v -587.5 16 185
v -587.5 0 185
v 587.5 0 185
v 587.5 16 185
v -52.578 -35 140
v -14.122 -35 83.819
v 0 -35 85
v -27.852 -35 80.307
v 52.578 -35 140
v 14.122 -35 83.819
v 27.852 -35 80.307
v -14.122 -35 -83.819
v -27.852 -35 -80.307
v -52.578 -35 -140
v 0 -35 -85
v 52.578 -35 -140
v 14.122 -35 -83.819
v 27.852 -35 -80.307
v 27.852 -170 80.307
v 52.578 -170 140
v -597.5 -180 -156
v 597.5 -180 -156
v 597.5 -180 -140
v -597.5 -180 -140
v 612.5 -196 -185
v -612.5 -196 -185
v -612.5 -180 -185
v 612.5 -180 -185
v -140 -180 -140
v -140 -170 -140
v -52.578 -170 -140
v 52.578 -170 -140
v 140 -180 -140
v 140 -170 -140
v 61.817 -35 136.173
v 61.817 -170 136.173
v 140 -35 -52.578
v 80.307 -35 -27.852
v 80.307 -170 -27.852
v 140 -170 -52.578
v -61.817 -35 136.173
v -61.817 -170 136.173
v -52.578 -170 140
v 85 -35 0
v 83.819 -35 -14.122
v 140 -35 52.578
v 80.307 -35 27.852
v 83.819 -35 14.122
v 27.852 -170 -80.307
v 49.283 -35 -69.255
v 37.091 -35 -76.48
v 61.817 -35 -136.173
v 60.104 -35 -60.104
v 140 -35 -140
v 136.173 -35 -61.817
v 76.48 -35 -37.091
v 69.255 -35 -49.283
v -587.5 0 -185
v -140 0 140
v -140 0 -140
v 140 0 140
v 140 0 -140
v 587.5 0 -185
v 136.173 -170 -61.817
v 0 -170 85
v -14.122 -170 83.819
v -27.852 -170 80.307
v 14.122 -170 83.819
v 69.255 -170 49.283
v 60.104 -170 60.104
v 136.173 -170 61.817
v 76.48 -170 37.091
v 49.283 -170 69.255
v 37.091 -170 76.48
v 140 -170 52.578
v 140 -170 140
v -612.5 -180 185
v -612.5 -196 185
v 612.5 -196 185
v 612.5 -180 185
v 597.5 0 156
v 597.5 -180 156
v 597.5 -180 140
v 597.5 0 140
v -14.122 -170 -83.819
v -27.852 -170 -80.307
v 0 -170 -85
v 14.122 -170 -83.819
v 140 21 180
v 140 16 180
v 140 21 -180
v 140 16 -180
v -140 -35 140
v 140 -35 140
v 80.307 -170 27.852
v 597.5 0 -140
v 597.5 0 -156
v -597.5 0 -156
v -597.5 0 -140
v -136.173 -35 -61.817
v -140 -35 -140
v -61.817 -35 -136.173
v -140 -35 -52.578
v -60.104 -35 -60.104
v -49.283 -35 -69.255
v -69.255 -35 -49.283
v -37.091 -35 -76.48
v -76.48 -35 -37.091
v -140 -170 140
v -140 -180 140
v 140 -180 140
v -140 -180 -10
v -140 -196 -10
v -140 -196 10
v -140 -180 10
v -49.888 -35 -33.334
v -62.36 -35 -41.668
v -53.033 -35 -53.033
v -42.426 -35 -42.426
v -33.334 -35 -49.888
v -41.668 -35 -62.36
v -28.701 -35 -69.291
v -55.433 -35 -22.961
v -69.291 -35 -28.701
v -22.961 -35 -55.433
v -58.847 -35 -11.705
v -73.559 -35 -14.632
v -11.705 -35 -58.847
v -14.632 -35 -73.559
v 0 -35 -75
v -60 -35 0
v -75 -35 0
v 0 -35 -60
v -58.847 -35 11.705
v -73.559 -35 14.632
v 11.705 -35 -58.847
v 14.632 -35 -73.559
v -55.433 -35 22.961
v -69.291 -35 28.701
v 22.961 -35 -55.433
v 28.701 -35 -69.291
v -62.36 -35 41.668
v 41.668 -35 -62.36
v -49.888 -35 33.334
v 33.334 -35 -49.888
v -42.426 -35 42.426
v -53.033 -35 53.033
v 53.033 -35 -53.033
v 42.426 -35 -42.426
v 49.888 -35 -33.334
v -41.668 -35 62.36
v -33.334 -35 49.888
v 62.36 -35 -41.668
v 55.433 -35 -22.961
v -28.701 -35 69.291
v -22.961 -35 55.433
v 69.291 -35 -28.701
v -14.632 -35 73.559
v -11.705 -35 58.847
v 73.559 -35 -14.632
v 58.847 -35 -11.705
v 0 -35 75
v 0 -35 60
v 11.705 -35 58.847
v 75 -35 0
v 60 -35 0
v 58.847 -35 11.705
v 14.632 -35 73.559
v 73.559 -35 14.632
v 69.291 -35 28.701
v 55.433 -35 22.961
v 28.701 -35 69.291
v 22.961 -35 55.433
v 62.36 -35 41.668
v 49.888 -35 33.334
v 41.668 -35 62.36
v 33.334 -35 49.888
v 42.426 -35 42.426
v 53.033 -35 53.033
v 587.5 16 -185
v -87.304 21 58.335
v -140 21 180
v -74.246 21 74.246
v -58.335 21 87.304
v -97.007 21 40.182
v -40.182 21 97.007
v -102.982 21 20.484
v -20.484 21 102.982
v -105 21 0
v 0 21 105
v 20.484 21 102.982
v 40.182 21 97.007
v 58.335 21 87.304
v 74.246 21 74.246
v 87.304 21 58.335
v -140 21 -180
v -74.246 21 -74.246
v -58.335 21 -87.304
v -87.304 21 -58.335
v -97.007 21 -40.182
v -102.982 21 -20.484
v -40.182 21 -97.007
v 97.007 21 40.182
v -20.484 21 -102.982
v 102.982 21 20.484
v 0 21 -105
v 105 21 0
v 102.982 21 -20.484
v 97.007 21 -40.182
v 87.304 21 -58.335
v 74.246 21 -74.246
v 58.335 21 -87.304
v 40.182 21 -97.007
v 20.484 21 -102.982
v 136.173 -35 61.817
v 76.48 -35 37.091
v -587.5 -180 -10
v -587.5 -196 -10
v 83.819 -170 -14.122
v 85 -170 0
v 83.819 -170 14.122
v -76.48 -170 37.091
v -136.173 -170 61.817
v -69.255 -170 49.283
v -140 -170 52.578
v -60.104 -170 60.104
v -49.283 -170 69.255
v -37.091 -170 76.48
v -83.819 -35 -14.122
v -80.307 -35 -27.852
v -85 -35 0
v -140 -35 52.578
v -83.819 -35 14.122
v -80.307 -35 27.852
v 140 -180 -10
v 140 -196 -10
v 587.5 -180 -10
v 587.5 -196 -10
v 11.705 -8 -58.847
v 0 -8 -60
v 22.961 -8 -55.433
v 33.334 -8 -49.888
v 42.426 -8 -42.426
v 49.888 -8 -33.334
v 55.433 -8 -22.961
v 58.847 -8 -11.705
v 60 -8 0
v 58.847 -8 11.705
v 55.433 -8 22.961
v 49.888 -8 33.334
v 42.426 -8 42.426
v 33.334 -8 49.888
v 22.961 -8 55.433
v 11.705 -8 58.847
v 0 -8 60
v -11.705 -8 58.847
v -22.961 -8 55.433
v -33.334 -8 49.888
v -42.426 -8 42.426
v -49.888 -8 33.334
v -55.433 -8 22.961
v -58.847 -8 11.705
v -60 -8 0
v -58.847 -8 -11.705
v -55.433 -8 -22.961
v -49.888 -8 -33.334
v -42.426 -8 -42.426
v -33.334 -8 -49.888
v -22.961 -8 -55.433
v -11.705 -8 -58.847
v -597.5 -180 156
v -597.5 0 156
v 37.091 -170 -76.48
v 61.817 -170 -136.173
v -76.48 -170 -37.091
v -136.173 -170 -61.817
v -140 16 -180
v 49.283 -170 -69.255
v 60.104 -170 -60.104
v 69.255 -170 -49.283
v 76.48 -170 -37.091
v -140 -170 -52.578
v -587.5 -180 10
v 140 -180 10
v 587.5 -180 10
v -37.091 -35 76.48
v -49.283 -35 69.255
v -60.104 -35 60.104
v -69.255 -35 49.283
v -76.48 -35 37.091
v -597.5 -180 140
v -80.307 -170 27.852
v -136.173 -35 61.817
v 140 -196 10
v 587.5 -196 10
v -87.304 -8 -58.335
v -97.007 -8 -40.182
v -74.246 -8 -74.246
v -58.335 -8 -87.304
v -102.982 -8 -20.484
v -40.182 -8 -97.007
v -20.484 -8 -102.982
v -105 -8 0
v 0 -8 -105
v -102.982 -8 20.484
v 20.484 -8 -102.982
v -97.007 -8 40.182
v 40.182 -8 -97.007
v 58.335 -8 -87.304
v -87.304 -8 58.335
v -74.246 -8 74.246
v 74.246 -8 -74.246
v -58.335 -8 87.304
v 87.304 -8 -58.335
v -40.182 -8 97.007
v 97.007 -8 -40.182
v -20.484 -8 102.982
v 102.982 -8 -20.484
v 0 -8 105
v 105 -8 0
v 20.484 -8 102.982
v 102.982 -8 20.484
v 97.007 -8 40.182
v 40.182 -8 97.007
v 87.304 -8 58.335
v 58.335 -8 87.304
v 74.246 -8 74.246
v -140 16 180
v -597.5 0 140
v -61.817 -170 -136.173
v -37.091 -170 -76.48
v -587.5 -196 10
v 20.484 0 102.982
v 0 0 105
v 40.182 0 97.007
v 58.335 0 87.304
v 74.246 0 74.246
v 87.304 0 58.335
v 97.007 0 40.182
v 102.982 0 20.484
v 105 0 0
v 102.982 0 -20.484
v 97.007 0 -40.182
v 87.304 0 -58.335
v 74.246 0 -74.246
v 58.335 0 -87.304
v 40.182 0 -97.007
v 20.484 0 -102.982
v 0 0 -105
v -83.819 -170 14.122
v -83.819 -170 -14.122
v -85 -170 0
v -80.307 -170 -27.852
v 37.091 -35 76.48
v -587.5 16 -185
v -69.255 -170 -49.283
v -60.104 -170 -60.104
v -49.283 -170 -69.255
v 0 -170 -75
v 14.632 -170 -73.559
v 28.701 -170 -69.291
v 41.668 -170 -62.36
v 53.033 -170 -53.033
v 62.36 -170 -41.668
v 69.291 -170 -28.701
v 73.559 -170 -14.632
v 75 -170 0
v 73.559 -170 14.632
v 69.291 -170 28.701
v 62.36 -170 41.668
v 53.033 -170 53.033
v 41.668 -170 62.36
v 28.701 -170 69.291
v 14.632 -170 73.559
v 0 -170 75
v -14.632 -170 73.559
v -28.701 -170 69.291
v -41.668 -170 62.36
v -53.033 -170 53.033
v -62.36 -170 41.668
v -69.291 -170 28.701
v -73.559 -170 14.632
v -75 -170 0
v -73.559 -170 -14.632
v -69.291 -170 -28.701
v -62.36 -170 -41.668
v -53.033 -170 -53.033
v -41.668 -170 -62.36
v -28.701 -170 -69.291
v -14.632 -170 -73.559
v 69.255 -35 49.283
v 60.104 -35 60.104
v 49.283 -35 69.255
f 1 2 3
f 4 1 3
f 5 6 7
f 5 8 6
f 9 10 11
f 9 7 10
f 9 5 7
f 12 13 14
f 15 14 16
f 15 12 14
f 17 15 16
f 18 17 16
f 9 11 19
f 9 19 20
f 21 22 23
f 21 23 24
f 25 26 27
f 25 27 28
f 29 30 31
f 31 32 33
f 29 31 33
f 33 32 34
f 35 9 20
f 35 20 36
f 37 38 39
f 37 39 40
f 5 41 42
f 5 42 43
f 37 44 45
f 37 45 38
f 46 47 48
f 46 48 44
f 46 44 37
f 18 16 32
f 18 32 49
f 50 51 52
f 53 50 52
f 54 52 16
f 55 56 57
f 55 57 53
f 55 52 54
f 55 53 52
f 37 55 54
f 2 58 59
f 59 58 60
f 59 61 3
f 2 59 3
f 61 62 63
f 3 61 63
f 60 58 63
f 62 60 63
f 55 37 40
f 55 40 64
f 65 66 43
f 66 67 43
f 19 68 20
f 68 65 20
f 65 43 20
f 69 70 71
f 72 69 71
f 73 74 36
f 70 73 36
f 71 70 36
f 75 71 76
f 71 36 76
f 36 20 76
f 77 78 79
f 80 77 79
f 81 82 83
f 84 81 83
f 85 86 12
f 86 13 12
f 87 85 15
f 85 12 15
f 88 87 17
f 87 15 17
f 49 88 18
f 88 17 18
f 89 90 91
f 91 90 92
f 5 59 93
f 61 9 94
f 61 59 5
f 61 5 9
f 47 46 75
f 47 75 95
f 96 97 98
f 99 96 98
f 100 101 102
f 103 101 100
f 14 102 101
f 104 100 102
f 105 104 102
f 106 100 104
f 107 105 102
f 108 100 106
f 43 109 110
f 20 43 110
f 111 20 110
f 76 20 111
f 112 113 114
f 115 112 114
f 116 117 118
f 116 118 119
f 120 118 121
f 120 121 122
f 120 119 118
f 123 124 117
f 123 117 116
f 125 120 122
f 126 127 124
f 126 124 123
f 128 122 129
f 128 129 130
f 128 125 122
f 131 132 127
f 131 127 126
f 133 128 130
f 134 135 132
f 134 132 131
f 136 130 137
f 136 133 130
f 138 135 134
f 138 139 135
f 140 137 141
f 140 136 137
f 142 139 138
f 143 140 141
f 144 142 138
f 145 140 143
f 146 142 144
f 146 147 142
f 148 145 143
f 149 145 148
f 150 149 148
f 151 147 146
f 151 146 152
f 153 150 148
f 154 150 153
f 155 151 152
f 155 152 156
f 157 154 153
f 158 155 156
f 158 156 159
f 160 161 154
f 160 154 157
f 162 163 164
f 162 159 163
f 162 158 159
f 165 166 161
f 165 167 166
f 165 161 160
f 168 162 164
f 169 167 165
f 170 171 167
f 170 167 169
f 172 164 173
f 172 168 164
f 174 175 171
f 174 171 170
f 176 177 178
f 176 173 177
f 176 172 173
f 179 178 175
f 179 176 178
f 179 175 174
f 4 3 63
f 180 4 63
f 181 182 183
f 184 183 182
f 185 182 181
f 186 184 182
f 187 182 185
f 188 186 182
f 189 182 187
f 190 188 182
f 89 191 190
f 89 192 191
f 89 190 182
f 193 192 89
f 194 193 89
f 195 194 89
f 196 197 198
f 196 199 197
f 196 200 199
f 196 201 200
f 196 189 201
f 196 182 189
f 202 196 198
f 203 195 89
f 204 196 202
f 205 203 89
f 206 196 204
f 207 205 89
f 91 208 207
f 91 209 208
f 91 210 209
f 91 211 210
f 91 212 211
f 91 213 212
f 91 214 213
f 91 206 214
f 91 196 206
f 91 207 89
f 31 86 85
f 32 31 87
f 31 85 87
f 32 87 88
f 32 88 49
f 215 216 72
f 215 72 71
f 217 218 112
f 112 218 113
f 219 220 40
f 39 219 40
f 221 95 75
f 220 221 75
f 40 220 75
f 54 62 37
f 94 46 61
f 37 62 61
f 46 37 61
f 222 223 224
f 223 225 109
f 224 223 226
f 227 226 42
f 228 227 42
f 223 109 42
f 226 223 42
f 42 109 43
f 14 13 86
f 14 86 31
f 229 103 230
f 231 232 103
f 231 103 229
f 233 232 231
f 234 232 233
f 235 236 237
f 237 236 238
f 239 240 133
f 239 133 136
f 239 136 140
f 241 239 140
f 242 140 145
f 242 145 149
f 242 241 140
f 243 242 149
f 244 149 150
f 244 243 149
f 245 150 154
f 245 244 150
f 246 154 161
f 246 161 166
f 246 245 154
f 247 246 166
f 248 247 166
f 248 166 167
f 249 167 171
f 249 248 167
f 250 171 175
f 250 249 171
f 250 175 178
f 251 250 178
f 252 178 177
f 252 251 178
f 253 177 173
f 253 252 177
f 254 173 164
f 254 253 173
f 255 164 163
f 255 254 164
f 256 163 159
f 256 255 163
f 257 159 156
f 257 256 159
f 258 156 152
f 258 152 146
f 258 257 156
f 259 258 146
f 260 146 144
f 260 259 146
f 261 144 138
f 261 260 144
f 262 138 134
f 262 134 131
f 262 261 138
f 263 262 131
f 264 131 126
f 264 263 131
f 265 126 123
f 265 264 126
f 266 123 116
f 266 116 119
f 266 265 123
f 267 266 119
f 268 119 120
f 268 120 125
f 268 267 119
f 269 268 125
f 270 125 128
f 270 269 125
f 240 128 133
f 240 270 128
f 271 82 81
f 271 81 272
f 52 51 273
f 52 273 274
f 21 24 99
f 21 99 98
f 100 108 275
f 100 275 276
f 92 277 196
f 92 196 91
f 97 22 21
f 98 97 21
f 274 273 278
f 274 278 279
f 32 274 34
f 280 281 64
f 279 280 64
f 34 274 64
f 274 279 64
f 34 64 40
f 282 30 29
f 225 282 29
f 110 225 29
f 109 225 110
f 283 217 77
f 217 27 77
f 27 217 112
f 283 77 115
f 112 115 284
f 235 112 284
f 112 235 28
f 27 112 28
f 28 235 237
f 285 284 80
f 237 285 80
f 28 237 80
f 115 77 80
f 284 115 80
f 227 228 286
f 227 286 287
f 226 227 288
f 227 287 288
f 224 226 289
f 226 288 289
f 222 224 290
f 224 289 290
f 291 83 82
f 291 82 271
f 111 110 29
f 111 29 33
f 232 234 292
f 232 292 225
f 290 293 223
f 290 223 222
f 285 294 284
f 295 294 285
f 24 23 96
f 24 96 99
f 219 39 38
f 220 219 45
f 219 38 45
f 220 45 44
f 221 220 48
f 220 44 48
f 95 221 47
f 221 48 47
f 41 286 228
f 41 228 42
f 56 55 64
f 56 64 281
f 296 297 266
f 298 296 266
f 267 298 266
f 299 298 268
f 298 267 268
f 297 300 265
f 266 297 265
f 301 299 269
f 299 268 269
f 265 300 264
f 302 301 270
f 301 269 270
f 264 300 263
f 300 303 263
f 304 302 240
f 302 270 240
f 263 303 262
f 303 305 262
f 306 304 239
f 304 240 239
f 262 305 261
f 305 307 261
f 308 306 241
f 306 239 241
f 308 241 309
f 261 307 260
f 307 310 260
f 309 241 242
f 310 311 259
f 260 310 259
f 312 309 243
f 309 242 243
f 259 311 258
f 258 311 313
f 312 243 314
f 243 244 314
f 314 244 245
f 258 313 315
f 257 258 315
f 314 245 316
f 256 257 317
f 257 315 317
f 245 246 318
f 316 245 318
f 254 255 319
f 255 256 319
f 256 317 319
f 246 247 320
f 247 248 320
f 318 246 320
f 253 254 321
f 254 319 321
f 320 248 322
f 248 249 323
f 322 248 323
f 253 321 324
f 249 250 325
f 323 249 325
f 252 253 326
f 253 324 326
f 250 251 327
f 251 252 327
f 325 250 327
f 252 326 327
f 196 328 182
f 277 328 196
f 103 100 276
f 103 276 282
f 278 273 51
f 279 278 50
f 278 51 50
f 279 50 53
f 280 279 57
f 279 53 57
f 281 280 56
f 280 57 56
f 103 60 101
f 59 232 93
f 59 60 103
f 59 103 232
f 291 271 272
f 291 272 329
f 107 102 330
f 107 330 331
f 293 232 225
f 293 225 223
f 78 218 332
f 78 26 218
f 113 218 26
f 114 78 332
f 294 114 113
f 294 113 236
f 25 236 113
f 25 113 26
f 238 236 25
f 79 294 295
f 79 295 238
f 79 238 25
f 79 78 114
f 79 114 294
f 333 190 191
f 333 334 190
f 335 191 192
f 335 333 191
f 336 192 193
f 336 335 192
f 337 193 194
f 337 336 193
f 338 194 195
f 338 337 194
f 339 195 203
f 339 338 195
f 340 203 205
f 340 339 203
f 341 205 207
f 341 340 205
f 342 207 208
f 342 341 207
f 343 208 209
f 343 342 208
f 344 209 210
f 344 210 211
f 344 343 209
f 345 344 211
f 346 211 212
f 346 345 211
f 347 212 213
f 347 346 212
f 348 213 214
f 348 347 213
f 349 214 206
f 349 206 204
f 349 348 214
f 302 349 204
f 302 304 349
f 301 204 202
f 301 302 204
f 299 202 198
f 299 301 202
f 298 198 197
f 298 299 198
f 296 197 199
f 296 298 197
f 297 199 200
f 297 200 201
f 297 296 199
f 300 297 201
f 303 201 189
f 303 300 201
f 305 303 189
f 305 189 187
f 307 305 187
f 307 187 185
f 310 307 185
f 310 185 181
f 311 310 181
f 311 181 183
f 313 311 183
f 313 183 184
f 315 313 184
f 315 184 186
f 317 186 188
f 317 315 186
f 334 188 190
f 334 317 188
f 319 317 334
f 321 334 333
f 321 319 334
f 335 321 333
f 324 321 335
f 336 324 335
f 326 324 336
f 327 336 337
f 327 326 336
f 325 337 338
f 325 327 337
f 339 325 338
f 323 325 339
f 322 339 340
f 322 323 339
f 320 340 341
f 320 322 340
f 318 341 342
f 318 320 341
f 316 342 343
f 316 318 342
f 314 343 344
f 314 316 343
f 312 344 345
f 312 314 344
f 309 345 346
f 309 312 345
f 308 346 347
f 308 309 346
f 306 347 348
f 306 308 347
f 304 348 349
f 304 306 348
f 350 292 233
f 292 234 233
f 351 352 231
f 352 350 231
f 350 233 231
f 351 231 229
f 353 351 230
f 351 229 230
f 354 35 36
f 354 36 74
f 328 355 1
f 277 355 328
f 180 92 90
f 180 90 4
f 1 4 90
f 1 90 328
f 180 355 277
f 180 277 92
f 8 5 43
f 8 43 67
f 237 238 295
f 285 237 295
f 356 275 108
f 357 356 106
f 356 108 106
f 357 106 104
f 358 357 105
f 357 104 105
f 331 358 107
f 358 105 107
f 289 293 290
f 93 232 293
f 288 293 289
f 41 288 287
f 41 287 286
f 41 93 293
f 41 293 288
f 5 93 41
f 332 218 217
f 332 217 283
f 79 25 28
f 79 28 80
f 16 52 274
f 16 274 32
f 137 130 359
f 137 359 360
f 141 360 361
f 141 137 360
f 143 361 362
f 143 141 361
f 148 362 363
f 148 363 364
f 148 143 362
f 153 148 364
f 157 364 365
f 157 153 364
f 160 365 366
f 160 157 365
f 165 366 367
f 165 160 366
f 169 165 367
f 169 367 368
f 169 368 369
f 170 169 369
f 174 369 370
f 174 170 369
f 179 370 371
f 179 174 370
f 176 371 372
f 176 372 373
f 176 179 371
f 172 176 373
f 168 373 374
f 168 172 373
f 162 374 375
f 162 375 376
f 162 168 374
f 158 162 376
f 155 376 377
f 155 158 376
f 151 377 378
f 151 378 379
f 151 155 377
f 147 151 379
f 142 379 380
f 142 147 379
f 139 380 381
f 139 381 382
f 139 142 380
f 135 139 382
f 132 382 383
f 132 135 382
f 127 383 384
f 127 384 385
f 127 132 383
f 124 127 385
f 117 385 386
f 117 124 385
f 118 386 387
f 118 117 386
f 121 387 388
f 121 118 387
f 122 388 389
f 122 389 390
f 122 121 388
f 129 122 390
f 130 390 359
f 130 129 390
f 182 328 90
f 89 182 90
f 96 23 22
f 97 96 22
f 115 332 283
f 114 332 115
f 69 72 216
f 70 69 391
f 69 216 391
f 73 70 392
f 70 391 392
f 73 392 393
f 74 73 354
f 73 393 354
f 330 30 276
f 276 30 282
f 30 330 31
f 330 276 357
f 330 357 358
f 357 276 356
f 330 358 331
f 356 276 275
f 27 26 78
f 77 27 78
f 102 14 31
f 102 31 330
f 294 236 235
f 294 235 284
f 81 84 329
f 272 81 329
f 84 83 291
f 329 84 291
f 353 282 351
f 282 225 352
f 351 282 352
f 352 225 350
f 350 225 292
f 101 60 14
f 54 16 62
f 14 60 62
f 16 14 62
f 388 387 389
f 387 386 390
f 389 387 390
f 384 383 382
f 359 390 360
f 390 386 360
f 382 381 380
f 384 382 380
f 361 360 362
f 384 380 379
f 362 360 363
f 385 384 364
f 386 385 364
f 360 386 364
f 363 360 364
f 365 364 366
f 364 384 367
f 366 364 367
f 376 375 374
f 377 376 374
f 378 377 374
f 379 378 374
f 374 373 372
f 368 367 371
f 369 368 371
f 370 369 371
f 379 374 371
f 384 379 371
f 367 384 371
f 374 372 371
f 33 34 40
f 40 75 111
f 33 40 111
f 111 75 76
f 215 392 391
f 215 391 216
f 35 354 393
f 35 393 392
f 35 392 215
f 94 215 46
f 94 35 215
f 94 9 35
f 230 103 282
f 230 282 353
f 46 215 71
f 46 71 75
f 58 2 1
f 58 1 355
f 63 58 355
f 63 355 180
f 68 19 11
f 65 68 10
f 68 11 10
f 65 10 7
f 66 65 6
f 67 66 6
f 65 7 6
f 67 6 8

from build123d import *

# Parameters (mm, degrees)
SKETCH_1_W               = 1175
SKETCH_1_H               = 370
SKETCH_1_R               = 105
EXTRUDE_1_DEPTH          = 16
SKETCH_6_W               = 280
SKETCH_6_H               = 360
SKETCH_6_R               = 105
EXTRUDE_5_DEPTH          = 5
EXTRUDE_START            = 8
SKETCH_7_W               = 280
SKETCH_7_H               = 280
SKETCH_7_R               = 105
EXTRUDE_6_DEPTH          = 8
SKETCH_8_W               = 280
SKETCH_8_H               = 280
SKETCH_8_R               = 60
EXTRUDE_7_DEPTH          = 27
SKETCH_9_R               = 85
SKETCH_9_R_2             = 75
EXTRUDE_8_DEPTH          = 135
EXTRUDE_9_DEPTH          = 135
PATTERN_CIRCULAR_1_COUNT = 8
SKETCH_11_W              = 280
SKETCH_11_H              = 280
EXTRUDE_10_DEPTH         = 10
SKETCH_15_W              = 1195
SKETCH_15_H              = 16
EXTRUDE_14_DEPTH         = 180
EXTRUDE_14_2_DEPTH       = 180
SKETCH_16_W              = 1225
SKETCH_16_H              = 370
EXTRUDE_39_DEPTH         = 16
SKETCH_17_W              = 447.5
SKETCH_17_H              = 20
CUT_EXTRUDE_1_DEPTH      = 16


with BuildPart() as part:
    # 草图1 → 凸台-拉伸1 (new body)
    with BuildSketch(Plane(origin=(0, 0, 0), x_dir=(1, 0, 0), z_dir=(0, 1, 0))):
        Rectangle(SKETCH_1_W, SKETCH_1_H)
        with Locations(Location((0, 0, 0), (0, 0, 270))):
            Circle(SKETCH_1_R, mode=Mode.SUBTRACT)
    extrude(amount=EXTRUDE_1_DEPTH)

    # 草图6 → 凸台-拉伸5 (add)
    with BuildSketch(Plane(origin=(0, 16, 0), x_dir=(1, 0, 0), z_dir=(0, 1, 0))):
        Rectangle(SKETCH_6_W, SKETCH_6_H)
        with Locations(Location((0, 0, 0), (0, 0, 270))):
            Circle(SKETCH_6_R, mode=Mode.SUBTRACT)
    extrude(amount=EXTRUDE_5_DEPTH)

    # 草图7 → 凸台-拉伸6 (add)
    with BuildSketch(Plane.XZ.offset(EXTRUDE_START)):
        Rectangle(SKETCH_7_W, SKETCH_7_H)
        with Locations(Location((0, 0, 0), (0, 0, 270))):
            Circle(SKETCH_7_R, mode=Mode.SUBTRACT)
    extrude(amount=-EXTRUDE_6_DEPTH)

    # 草图8 → 凸台-拉伸7 (add)
    with BuildSketch(Plane.XZ.offset(8)):
        Rectangle(SKETCH_8_W, SKETCH_8_H)
        with Locations(Location((0, 0, 0), (0, 0, 270))):
            Circle(SKETCH_8_R, mode=Mode.SUBTRACT)
    extrude(amount=EXTRUDE_7_DEPTH)

    # 草图9 → 凸台-拉伸8 (add)
    with BuildSketch(Plane.XZ.offset(35)):
        with Locations(Location((0, 0, 0), (0, 0, 270))):
            Circle(SKETCH_9_R)
        with Locations(Location((0, 0, 0), (0, 0, 270))):
            Circle(SKETCH_9_R_2, mode=Mode.SUBTRACT)
    extrude(amount=EXTRUDE_8_DEPTH)

    # 草图10 → 凸台-拉伸9 (add)
    with BuildSketch(Plane(origin=(0, -35, 0), x_dir=(-1, 0, 0), z_dir=(0, -1, 0))):
        with BuildLine():
            Line((61.816733056, -136.173165676), (52.577937731, -140))
            Line((52.577937731, -140), (27.852368346, -80.307195054))
            ThreePointArc((27.852368346, -80.307195054), (32.528091751, -78.529760263), (37.091163671, -76.480360731))
            Line((37.091163671, -76.480360731), (61.816733056, -136.173165676))
        make_face()
    extrude_9 = extrude(amount=EXTRUDE_9_DEPTH)

    # 阵列(圆周)1: 凸台-拉伸9 ×8 about axis
    pattern_circular_1_axis = Axis((0, 0, 0), (0, 1, 0))
    for i in range(1, PATTERN_CIRCULAR_1_COUNT):
        add(extrude_9.rotate(pattern_circular_1_axis, i * 360 / PATTERN_CIRCULAR_1_COUNT))

    # 草图11 → 凸台-拉伸10 (add)
    with BuildSketch(Plane.XZ.offset(170)):
        Rectangle(SKETCH_11_W, SKETCH_11_H)
    extrude(amount=EXTRUDE_10_DEPTH)


with BuildPart() as body_2:
    # 草图15 → 凸台-拉伸14 (new body)
    with BuildSketch(Plane(origin=(0, -180, 0), x_dir=(-1, 0, 0), z_dir=(0, -1, 0))):
        with Locations((0, -148)):
            Rectangle(SKETCH_15_W, SKETCH_15_H)
    extrude(amount=-EXTRUDE_14_DEPTH)


with BuildPart() as body_3:
    # 草图15 → Extrude 14 2 (new body)
    with BuildSketch(Plane(origin=(0, -180, 0), x_dir=(-1, 0, 0), z_dir=(0, -1, 0))):
        with Locations((0, 148)):
            Rectangle(SKETCH_15_W, SKETCH_15_H)
    extrude(amount=-EXTRUDE_14_2_DEPTH)


with BuildPart() as body_4:
    # 草图16 → 凸台-拉伸39 (new body)
    with BuildSketch(Plane.XZ.offset(196)):
        Rectangle(SKETCH_16_W, SKETCH_16_H)
    extrude(amount=-EXTRUDE_39_DEPTH)

    # 草图17 → 切除-拉伸1 (cut)
    with BuildSketch(Plane.XZ.offset(196)):
        with Locations((-363.75, 0)):
            Rectangle(SKETCH_17_W, SKETCH_17_H)
        with Locations((363.75, 0)):
            Rectangle(SKETCH_17_W, SKETCH_17_H)
    extrude(amount=-CUT_EXTRUDE_1_DEPTH, mode=Mode.SUBTRACT)


solid = Compound([part.part, body_2.part, body_3.part, body_4.part])
